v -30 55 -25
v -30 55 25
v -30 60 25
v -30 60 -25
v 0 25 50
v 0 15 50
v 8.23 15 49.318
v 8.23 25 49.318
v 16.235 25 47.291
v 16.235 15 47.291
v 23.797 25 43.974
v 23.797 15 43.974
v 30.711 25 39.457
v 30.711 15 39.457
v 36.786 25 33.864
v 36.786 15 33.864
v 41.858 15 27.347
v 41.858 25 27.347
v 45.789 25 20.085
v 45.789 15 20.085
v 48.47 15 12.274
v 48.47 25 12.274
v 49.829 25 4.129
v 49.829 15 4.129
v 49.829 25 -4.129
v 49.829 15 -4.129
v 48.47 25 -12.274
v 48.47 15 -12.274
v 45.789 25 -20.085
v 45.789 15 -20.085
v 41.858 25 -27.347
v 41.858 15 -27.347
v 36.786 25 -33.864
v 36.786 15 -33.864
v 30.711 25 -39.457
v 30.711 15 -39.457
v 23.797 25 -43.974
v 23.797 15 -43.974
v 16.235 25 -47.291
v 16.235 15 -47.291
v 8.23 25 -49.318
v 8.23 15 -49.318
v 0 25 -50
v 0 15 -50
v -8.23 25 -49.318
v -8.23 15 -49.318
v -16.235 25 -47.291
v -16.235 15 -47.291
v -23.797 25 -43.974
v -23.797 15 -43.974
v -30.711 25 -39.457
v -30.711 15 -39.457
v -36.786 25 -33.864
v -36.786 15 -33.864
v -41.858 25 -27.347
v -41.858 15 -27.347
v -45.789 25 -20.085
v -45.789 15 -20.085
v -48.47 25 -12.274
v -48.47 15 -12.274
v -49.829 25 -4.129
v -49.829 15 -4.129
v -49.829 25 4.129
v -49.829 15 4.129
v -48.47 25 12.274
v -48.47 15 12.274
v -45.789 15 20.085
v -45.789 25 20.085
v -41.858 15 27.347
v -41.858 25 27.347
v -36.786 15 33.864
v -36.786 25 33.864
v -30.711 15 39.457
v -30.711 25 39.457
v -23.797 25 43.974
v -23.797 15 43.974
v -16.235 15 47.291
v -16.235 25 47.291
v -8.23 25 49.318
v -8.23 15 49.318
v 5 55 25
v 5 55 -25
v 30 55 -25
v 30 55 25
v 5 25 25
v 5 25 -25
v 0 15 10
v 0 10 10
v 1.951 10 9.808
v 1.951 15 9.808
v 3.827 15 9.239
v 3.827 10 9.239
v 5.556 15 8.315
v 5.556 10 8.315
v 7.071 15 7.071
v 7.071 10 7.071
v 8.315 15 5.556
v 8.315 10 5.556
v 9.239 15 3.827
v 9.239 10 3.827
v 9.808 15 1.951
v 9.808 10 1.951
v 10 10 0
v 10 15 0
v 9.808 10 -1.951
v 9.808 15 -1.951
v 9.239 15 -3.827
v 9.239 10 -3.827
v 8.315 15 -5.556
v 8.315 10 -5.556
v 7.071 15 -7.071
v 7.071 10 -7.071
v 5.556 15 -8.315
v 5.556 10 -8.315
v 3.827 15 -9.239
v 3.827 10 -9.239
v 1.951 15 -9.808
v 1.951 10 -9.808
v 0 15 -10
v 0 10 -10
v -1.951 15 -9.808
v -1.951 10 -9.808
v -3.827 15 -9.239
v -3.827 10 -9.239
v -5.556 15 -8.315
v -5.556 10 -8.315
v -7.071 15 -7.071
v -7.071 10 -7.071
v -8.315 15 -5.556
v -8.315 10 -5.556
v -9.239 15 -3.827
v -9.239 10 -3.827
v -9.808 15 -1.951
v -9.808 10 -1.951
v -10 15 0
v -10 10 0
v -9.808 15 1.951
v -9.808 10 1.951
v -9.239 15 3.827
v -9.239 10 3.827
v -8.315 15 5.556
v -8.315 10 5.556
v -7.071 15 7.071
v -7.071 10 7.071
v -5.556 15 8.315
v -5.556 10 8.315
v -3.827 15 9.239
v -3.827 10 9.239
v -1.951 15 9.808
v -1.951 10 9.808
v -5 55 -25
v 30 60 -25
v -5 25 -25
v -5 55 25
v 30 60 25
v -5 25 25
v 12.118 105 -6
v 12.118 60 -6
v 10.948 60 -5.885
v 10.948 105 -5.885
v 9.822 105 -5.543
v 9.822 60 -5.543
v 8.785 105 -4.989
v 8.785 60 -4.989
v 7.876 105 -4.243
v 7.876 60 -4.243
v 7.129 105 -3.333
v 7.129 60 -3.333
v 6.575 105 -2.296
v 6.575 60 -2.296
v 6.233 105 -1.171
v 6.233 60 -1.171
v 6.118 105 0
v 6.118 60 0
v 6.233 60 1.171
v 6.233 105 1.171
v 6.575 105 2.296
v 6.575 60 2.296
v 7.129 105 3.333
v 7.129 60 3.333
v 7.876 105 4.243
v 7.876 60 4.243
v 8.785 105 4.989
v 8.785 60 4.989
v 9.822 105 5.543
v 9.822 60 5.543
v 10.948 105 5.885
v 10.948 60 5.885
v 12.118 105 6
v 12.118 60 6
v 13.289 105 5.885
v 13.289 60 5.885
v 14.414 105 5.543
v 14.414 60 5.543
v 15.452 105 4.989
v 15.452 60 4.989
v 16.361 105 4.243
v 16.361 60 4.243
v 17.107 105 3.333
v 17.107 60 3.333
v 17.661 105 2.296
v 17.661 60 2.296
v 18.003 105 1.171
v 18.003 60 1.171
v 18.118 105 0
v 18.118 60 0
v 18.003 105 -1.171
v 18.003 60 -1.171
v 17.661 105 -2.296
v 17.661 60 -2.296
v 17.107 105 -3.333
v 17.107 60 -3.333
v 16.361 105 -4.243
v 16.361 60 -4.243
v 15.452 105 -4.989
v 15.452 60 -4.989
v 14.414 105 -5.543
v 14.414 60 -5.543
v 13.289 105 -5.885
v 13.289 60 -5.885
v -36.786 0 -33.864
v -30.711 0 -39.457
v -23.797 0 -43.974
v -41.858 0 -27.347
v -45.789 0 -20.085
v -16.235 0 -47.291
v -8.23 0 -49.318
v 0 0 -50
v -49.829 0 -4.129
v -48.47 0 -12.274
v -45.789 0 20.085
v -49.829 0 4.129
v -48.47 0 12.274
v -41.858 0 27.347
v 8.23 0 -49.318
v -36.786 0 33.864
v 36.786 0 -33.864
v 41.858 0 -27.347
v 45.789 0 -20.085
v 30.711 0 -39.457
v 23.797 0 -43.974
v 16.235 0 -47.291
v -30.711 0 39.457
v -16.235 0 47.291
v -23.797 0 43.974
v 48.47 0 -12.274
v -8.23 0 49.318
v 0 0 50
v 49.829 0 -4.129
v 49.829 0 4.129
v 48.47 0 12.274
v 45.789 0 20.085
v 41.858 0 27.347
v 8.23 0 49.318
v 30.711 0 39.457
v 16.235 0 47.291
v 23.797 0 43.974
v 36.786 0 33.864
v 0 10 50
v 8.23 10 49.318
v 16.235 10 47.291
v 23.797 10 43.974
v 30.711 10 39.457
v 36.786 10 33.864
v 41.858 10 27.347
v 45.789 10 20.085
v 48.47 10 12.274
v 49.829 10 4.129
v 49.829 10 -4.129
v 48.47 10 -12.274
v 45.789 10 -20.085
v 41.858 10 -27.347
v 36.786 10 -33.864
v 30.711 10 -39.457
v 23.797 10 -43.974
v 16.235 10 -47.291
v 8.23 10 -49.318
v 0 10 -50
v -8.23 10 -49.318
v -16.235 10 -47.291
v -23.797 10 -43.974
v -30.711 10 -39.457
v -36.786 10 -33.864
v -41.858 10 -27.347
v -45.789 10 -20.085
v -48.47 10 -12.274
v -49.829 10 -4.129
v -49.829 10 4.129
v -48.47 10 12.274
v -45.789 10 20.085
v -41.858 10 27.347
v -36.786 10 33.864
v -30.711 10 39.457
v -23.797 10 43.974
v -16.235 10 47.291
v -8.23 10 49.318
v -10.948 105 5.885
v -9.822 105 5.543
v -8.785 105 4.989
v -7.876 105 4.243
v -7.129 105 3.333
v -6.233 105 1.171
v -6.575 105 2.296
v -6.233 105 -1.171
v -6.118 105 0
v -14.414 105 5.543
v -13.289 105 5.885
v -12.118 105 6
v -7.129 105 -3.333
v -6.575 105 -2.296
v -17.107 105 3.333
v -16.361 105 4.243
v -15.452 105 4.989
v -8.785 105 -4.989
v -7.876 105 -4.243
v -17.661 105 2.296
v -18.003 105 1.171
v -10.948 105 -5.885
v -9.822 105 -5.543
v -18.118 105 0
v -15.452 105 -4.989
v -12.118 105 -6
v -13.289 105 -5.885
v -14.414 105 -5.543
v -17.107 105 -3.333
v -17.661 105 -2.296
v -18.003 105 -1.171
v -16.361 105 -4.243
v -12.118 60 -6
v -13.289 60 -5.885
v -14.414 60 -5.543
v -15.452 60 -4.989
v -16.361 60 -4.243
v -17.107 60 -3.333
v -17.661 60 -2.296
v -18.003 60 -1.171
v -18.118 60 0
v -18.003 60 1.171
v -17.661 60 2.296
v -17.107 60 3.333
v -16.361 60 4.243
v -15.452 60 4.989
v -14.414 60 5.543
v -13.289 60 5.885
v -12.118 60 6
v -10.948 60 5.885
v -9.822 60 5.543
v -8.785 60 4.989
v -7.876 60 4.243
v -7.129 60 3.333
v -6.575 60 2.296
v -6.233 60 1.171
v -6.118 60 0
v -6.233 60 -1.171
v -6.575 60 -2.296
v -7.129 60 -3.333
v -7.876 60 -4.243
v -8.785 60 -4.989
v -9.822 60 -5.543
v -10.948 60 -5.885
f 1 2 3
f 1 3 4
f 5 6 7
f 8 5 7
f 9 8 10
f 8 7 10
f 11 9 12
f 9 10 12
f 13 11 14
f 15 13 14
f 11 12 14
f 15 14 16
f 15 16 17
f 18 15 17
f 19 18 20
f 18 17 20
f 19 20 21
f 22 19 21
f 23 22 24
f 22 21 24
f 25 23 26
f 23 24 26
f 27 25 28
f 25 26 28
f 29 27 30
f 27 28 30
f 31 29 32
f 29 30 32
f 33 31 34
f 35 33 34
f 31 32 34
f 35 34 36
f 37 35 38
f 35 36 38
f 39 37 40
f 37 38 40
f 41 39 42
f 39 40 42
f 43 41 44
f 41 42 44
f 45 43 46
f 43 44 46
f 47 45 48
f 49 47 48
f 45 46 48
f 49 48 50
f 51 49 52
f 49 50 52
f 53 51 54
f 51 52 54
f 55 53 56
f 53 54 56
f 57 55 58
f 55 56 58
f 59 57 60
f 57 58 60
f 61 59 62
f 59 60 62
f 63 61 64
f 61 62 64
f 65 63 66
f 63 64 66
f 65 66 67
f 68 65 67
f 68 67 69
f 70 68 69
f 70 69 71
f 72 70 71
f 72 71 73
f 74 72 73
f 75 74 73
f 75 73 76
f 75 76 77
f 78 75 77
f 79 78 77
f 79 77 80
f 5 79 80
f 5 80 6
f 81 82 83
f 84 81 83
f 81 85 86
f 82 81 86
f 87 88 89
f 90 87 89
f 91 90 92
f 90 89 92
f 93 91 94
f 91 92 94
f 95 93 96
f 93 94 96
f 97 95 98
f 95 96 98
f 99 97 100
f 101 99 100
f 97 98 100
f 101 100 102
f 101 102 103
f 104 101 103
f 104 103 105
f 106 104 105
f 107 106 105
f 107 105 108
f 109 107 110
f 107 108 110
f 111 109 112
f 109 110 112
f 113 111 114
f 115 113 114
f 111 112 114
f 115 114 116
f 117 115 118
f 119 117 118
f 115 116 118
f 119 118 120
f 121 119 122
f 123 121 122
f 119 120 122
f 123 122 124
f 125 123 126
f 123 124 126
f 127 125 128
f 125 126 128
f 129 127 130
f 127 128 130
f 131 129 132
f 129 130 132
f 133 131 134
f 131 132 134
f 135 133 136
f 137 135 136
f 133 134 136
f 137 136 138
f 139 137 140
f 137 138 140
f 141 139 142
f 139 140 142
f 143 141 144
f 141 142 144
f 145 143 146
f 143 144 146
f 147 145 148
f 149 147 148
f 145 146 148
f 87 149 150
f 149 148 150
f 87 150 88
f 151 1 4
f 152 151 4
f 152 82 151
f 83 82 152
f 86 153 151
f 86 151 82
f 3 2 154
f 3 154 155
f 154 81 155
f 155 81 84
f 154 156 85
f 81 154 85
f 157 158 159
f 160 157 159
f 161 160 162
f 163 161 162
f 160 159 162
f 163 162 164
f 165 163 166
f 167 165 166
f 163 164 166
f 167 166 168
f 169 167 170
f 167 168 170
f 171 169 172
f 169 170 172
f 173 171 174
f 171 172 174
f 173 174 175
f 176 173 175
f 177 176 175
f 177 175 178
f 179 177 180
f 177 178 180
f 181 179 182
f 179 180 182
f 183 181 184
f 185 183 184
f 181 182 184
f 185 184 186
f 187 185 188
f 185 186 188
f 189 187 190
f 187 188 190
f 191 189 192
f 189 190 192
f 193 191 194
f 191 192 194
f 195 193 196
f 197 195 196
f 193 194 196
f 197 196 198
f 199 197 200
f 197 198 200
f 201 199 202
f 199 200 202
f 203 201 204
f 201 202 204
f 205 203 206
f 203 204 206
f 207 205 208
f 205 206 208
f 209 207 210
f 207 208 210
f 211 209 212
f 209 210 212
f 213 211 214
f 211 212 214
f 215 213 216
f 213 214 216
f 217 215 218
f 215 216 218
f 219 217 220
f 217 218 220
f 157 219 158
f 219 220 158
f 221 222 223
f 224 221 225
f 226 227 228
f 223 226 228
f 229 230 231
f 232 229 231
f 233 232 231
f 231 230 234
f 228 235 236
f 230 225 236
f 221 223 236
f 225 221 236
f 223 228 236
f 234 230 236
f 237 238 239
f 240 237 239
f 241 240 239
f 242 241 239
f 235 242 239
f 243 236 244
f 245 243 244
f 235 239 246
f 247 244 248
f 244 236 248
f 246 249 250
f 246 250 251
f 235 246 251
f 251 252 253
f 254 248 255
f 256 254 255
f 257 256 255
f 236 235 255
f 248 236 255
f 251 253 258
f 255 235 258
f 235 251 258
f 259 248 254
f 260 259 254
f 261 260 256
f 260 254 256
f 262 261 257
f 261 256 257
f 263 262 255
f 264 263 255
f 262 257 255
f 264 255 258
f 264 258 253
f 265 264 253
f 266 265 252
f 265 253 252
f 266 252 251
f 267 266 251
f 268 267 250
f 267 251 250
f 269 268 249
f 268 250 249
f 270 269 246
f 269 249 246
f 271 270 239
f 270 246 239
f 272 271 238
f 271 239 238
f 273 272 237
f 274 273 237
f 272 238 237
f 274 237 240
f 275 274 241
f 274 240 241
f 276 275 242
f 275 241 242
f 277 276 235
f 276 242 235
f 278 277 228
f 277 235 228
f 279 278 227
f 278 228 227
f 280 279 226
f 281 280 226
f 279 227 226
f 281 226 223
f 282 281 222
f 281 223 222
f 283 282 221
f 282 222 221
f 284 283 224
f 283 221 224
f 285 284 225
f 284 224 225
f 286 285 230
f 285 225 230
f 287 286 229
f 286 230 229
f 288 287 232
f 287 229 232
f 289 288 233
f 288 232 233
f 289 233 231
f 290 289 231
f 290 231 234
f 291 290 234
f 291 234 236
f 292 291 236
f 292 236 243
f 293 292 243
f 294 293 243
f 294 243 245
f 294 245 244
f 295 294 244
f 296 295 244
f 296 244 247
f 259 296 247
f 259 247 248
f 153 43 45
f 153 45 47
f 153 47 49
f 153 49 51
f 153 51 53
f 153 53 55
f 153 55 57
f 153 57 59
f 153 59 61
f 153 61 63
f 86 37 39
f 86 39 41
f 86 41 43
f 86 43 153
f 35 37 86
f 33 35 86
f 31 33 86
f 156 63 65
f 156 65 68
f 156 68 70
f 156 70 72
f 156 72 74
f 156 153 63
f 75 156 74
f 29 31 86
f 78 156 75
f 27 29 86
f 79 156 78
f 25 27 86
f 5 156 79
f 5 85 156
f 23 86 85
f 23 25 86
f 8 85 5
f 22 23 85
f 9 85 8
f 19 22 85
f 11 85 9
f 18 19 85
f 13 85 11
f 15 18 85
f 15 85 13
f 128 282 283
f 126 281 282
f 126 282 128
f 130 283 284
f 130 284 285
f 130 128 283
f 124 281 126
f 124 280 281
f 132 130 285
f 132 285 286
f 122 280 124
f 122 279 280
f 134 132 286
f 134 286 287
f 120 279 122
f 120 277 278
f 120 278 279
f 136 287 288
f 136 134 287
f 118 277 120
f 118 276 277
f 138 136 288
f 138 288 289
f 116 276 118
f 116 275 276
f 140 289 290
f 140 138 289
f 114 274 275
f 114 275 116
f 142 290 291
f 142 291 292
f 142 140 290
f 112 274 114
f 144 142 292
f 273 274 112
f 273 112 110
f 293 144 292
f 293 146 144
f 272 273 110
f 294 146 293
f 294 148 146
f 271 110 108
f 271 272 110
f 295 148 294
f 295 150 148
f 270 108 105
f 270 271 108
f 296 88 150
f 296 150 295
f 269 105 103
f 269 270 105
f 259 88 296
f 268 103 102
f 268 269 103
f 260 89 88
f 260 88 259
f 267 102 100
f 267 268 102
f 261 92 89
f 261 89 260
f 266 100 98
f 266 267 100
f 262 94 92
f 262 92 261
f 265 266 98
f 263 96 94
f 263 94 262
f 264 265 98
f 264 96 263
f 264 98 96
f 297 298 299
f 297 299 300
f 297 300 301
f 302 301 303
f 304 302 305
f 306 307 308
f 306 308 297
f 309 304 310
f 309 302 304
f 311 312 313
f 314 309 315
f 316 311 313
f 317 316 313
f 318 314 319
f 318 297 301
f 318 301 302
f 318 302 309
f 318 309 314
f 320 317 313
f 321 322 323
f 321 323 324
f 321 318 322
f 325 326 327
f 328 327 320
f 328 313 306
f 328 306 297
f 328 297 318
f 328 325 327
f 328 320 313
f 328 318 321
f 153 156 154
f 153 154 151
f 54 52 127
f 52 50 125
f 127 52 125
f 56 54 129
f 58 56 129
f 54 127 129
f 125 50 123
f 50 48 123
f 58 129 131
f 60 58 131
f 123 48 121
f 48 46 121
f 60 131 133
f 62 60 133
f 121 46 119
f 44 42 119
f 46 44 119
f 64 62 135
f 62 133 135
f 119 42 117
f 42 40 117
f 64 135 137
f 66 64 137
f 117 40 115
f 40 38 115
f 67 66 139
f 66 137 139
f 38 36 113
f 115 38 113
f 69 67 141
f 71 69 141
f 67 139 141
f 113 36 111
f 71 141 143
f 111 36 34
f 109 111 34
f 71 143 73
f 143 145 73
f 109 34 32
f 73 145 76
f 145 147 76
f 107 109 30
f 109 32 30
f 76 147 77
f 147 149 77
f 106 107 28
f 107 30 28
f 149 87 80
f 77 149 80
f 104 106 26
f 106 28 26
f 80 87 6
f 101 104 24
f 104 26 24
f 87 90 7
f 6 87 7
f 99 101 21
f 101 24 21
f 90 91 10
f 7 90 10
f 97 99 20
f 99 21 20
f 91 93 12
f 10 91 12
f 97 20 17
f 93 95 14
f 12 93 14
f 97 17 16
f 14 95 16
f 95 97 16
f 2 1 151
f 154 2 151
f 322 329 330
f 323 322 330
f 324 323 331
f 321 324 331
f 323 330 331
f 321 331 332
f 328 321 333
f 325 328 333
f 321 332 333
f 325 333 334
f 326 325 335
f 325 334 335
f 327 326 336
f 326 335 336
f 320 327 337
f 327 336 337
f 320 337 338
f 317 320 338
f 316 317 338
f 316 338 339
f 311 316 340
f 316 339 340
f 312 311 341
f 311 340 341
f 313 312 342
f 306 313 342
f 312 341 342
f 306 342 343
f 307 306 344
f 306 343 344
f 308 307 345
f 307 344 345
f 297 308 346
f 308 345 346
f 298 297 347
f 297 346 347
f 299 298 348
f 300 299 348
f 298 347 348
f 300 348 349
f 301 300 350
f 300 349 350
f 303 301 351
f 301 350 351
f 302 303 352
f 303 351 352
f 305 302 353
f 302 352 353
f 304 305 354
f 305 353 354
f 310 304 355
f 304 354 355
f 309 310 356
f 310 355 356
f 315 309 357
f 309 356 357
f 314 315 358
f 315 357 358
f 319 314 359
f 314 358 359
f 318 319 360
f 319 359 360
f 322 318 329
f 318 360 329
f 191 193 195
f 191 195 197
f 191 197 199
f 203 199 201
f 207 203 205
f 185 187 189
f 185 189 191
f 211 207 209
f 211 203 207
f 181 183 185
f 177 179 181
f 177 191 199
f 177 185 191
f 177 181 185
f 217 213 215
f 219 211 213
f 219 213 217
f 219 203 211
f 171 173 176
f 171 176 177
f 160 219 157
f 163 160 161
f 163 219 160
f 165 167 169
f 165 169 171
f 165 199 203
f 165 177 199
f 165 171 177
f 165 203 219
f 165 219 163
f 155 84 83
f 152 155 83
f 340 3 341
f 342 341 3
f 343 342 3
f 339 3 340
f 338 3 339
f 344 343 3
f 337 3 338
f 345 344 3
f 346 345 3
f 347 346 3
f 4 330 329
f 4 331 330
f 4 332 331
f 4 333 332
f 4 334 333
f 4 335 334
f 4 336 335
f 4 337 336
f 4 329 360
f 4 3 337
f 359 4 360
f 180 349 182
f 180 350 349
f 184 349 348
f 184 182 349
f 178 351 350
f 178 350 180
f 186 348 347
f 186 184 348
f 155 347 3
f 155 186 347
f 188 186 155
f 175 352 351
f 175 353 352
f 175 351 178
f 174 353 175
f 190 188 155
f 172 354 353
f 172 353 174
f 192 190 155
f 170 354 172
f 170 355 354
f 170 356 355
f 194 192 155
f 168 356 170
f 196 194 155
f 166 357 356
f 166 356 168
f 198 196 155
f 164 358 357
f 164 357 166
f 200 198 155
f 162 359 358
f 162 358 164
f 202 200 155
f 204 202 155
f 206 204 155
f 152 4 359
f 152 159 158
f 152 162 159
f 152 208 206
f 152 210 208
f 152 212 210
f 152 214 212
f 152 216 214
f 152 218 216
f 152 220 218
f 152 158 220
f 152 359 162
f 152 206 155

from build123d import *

# Parameters (mm, degrees)
SKETCH_1_R      = 50
EXTRUDE_1_DEPTH = 10
SKETCH_2_R      = 10
EXTRUDE_2_DEPTH = 5
SKETCH_3_R      = 50
EXTRUDE_3_DEPTH = 10
SKETCH_4_W      = 10
SKETCH_4_H      = 50
EXTRUDE_4_DEPTH = 30
SKETCH_5_W      = 60
SKETCH_5_H      = 50
EXTRUDE_5_DEPTH = 5
SKETCH_6_R      = 6
EXTRUDE_6_DEPTH = 45


with BuildPart() as part:
    # 草图1 → 凸台-拉伸1 (new body)
    with BuildSketch(Plane(origin=(0, 0, 0), x_dir=(1, 0, 0), z_dir=(0, 1, 0))):
        with Locations(Location((0, 0, 0), (0, 0, 270))):
            Circle(SKETCH_1_R)
    extrude(amount=EXTRUDE_1_DEPTH)

    # 草图2 → 凸台-拉伸2 (add)
    with BuildSketch(Plane(origin=(0, 10, 0), x_dir=(1, 0, 0), z_dir=(0, 1, 0))):
        with Locations(Location((0, 0, 0), (0, 0, 270))):
            Circle(SKETCH_2_R)
    extrude(amount=EXTRUDE_2_DEPTH)

    # 草图3 → 凸台-拉伸3 (add)
    with BuildSketch(Plane(origin=(0, 15, 0), x_dir=(1, 0, 0), z_dir=(0, 1, 0))):
        with Locations(Location((0, 0, 0), (0, 0, 270))):
            Circle(SKETCH_3_R)
    extrude(amount=EXTRUDE_3_DEPTH)

    # 草图4 → 凸台-拉伸4 (add)
    with BuildSketch(Plane(origin=(0, 25, 0), x_dir=(1, 0, 0), z_dir=(0, 1, 0))):
        Rectangle(SKETCH_4_W, SKETCH_4_H)
    extrude(amount=EXTRUDE_4_DEPTH)

    # 草图5 → 凸台-拉伸5 (add)
    with BuildSketch(Plane(origin=(0, 55, 0), x_dir=(1, 0, 0), z_dir=(0, 1, 0))):
        Rectangle(SKETCH_5_W, SKETCH_5_H)
    extrude(amount=EXTRUDE_5_DEPTH)

    # 草图6 → 凸台-拉伸6 (add)
    with BuildSketch(Plane(origin=(0, 60, 0), x_dir=(1, 0, 0), z_dir=(0, 1, 0))):
        with Locations(Location((12.118185601, 0, 0), (0, 0, 90))):
            Circle(SKETCH_6_R)
        with Locations(Location((-12.118185601, 0, 0), (0, 0, 90))):
            Circle(SKETCH_6_R)
    extrude(amount=EXTRUDE_6_DEPTH)


solid = part.part
